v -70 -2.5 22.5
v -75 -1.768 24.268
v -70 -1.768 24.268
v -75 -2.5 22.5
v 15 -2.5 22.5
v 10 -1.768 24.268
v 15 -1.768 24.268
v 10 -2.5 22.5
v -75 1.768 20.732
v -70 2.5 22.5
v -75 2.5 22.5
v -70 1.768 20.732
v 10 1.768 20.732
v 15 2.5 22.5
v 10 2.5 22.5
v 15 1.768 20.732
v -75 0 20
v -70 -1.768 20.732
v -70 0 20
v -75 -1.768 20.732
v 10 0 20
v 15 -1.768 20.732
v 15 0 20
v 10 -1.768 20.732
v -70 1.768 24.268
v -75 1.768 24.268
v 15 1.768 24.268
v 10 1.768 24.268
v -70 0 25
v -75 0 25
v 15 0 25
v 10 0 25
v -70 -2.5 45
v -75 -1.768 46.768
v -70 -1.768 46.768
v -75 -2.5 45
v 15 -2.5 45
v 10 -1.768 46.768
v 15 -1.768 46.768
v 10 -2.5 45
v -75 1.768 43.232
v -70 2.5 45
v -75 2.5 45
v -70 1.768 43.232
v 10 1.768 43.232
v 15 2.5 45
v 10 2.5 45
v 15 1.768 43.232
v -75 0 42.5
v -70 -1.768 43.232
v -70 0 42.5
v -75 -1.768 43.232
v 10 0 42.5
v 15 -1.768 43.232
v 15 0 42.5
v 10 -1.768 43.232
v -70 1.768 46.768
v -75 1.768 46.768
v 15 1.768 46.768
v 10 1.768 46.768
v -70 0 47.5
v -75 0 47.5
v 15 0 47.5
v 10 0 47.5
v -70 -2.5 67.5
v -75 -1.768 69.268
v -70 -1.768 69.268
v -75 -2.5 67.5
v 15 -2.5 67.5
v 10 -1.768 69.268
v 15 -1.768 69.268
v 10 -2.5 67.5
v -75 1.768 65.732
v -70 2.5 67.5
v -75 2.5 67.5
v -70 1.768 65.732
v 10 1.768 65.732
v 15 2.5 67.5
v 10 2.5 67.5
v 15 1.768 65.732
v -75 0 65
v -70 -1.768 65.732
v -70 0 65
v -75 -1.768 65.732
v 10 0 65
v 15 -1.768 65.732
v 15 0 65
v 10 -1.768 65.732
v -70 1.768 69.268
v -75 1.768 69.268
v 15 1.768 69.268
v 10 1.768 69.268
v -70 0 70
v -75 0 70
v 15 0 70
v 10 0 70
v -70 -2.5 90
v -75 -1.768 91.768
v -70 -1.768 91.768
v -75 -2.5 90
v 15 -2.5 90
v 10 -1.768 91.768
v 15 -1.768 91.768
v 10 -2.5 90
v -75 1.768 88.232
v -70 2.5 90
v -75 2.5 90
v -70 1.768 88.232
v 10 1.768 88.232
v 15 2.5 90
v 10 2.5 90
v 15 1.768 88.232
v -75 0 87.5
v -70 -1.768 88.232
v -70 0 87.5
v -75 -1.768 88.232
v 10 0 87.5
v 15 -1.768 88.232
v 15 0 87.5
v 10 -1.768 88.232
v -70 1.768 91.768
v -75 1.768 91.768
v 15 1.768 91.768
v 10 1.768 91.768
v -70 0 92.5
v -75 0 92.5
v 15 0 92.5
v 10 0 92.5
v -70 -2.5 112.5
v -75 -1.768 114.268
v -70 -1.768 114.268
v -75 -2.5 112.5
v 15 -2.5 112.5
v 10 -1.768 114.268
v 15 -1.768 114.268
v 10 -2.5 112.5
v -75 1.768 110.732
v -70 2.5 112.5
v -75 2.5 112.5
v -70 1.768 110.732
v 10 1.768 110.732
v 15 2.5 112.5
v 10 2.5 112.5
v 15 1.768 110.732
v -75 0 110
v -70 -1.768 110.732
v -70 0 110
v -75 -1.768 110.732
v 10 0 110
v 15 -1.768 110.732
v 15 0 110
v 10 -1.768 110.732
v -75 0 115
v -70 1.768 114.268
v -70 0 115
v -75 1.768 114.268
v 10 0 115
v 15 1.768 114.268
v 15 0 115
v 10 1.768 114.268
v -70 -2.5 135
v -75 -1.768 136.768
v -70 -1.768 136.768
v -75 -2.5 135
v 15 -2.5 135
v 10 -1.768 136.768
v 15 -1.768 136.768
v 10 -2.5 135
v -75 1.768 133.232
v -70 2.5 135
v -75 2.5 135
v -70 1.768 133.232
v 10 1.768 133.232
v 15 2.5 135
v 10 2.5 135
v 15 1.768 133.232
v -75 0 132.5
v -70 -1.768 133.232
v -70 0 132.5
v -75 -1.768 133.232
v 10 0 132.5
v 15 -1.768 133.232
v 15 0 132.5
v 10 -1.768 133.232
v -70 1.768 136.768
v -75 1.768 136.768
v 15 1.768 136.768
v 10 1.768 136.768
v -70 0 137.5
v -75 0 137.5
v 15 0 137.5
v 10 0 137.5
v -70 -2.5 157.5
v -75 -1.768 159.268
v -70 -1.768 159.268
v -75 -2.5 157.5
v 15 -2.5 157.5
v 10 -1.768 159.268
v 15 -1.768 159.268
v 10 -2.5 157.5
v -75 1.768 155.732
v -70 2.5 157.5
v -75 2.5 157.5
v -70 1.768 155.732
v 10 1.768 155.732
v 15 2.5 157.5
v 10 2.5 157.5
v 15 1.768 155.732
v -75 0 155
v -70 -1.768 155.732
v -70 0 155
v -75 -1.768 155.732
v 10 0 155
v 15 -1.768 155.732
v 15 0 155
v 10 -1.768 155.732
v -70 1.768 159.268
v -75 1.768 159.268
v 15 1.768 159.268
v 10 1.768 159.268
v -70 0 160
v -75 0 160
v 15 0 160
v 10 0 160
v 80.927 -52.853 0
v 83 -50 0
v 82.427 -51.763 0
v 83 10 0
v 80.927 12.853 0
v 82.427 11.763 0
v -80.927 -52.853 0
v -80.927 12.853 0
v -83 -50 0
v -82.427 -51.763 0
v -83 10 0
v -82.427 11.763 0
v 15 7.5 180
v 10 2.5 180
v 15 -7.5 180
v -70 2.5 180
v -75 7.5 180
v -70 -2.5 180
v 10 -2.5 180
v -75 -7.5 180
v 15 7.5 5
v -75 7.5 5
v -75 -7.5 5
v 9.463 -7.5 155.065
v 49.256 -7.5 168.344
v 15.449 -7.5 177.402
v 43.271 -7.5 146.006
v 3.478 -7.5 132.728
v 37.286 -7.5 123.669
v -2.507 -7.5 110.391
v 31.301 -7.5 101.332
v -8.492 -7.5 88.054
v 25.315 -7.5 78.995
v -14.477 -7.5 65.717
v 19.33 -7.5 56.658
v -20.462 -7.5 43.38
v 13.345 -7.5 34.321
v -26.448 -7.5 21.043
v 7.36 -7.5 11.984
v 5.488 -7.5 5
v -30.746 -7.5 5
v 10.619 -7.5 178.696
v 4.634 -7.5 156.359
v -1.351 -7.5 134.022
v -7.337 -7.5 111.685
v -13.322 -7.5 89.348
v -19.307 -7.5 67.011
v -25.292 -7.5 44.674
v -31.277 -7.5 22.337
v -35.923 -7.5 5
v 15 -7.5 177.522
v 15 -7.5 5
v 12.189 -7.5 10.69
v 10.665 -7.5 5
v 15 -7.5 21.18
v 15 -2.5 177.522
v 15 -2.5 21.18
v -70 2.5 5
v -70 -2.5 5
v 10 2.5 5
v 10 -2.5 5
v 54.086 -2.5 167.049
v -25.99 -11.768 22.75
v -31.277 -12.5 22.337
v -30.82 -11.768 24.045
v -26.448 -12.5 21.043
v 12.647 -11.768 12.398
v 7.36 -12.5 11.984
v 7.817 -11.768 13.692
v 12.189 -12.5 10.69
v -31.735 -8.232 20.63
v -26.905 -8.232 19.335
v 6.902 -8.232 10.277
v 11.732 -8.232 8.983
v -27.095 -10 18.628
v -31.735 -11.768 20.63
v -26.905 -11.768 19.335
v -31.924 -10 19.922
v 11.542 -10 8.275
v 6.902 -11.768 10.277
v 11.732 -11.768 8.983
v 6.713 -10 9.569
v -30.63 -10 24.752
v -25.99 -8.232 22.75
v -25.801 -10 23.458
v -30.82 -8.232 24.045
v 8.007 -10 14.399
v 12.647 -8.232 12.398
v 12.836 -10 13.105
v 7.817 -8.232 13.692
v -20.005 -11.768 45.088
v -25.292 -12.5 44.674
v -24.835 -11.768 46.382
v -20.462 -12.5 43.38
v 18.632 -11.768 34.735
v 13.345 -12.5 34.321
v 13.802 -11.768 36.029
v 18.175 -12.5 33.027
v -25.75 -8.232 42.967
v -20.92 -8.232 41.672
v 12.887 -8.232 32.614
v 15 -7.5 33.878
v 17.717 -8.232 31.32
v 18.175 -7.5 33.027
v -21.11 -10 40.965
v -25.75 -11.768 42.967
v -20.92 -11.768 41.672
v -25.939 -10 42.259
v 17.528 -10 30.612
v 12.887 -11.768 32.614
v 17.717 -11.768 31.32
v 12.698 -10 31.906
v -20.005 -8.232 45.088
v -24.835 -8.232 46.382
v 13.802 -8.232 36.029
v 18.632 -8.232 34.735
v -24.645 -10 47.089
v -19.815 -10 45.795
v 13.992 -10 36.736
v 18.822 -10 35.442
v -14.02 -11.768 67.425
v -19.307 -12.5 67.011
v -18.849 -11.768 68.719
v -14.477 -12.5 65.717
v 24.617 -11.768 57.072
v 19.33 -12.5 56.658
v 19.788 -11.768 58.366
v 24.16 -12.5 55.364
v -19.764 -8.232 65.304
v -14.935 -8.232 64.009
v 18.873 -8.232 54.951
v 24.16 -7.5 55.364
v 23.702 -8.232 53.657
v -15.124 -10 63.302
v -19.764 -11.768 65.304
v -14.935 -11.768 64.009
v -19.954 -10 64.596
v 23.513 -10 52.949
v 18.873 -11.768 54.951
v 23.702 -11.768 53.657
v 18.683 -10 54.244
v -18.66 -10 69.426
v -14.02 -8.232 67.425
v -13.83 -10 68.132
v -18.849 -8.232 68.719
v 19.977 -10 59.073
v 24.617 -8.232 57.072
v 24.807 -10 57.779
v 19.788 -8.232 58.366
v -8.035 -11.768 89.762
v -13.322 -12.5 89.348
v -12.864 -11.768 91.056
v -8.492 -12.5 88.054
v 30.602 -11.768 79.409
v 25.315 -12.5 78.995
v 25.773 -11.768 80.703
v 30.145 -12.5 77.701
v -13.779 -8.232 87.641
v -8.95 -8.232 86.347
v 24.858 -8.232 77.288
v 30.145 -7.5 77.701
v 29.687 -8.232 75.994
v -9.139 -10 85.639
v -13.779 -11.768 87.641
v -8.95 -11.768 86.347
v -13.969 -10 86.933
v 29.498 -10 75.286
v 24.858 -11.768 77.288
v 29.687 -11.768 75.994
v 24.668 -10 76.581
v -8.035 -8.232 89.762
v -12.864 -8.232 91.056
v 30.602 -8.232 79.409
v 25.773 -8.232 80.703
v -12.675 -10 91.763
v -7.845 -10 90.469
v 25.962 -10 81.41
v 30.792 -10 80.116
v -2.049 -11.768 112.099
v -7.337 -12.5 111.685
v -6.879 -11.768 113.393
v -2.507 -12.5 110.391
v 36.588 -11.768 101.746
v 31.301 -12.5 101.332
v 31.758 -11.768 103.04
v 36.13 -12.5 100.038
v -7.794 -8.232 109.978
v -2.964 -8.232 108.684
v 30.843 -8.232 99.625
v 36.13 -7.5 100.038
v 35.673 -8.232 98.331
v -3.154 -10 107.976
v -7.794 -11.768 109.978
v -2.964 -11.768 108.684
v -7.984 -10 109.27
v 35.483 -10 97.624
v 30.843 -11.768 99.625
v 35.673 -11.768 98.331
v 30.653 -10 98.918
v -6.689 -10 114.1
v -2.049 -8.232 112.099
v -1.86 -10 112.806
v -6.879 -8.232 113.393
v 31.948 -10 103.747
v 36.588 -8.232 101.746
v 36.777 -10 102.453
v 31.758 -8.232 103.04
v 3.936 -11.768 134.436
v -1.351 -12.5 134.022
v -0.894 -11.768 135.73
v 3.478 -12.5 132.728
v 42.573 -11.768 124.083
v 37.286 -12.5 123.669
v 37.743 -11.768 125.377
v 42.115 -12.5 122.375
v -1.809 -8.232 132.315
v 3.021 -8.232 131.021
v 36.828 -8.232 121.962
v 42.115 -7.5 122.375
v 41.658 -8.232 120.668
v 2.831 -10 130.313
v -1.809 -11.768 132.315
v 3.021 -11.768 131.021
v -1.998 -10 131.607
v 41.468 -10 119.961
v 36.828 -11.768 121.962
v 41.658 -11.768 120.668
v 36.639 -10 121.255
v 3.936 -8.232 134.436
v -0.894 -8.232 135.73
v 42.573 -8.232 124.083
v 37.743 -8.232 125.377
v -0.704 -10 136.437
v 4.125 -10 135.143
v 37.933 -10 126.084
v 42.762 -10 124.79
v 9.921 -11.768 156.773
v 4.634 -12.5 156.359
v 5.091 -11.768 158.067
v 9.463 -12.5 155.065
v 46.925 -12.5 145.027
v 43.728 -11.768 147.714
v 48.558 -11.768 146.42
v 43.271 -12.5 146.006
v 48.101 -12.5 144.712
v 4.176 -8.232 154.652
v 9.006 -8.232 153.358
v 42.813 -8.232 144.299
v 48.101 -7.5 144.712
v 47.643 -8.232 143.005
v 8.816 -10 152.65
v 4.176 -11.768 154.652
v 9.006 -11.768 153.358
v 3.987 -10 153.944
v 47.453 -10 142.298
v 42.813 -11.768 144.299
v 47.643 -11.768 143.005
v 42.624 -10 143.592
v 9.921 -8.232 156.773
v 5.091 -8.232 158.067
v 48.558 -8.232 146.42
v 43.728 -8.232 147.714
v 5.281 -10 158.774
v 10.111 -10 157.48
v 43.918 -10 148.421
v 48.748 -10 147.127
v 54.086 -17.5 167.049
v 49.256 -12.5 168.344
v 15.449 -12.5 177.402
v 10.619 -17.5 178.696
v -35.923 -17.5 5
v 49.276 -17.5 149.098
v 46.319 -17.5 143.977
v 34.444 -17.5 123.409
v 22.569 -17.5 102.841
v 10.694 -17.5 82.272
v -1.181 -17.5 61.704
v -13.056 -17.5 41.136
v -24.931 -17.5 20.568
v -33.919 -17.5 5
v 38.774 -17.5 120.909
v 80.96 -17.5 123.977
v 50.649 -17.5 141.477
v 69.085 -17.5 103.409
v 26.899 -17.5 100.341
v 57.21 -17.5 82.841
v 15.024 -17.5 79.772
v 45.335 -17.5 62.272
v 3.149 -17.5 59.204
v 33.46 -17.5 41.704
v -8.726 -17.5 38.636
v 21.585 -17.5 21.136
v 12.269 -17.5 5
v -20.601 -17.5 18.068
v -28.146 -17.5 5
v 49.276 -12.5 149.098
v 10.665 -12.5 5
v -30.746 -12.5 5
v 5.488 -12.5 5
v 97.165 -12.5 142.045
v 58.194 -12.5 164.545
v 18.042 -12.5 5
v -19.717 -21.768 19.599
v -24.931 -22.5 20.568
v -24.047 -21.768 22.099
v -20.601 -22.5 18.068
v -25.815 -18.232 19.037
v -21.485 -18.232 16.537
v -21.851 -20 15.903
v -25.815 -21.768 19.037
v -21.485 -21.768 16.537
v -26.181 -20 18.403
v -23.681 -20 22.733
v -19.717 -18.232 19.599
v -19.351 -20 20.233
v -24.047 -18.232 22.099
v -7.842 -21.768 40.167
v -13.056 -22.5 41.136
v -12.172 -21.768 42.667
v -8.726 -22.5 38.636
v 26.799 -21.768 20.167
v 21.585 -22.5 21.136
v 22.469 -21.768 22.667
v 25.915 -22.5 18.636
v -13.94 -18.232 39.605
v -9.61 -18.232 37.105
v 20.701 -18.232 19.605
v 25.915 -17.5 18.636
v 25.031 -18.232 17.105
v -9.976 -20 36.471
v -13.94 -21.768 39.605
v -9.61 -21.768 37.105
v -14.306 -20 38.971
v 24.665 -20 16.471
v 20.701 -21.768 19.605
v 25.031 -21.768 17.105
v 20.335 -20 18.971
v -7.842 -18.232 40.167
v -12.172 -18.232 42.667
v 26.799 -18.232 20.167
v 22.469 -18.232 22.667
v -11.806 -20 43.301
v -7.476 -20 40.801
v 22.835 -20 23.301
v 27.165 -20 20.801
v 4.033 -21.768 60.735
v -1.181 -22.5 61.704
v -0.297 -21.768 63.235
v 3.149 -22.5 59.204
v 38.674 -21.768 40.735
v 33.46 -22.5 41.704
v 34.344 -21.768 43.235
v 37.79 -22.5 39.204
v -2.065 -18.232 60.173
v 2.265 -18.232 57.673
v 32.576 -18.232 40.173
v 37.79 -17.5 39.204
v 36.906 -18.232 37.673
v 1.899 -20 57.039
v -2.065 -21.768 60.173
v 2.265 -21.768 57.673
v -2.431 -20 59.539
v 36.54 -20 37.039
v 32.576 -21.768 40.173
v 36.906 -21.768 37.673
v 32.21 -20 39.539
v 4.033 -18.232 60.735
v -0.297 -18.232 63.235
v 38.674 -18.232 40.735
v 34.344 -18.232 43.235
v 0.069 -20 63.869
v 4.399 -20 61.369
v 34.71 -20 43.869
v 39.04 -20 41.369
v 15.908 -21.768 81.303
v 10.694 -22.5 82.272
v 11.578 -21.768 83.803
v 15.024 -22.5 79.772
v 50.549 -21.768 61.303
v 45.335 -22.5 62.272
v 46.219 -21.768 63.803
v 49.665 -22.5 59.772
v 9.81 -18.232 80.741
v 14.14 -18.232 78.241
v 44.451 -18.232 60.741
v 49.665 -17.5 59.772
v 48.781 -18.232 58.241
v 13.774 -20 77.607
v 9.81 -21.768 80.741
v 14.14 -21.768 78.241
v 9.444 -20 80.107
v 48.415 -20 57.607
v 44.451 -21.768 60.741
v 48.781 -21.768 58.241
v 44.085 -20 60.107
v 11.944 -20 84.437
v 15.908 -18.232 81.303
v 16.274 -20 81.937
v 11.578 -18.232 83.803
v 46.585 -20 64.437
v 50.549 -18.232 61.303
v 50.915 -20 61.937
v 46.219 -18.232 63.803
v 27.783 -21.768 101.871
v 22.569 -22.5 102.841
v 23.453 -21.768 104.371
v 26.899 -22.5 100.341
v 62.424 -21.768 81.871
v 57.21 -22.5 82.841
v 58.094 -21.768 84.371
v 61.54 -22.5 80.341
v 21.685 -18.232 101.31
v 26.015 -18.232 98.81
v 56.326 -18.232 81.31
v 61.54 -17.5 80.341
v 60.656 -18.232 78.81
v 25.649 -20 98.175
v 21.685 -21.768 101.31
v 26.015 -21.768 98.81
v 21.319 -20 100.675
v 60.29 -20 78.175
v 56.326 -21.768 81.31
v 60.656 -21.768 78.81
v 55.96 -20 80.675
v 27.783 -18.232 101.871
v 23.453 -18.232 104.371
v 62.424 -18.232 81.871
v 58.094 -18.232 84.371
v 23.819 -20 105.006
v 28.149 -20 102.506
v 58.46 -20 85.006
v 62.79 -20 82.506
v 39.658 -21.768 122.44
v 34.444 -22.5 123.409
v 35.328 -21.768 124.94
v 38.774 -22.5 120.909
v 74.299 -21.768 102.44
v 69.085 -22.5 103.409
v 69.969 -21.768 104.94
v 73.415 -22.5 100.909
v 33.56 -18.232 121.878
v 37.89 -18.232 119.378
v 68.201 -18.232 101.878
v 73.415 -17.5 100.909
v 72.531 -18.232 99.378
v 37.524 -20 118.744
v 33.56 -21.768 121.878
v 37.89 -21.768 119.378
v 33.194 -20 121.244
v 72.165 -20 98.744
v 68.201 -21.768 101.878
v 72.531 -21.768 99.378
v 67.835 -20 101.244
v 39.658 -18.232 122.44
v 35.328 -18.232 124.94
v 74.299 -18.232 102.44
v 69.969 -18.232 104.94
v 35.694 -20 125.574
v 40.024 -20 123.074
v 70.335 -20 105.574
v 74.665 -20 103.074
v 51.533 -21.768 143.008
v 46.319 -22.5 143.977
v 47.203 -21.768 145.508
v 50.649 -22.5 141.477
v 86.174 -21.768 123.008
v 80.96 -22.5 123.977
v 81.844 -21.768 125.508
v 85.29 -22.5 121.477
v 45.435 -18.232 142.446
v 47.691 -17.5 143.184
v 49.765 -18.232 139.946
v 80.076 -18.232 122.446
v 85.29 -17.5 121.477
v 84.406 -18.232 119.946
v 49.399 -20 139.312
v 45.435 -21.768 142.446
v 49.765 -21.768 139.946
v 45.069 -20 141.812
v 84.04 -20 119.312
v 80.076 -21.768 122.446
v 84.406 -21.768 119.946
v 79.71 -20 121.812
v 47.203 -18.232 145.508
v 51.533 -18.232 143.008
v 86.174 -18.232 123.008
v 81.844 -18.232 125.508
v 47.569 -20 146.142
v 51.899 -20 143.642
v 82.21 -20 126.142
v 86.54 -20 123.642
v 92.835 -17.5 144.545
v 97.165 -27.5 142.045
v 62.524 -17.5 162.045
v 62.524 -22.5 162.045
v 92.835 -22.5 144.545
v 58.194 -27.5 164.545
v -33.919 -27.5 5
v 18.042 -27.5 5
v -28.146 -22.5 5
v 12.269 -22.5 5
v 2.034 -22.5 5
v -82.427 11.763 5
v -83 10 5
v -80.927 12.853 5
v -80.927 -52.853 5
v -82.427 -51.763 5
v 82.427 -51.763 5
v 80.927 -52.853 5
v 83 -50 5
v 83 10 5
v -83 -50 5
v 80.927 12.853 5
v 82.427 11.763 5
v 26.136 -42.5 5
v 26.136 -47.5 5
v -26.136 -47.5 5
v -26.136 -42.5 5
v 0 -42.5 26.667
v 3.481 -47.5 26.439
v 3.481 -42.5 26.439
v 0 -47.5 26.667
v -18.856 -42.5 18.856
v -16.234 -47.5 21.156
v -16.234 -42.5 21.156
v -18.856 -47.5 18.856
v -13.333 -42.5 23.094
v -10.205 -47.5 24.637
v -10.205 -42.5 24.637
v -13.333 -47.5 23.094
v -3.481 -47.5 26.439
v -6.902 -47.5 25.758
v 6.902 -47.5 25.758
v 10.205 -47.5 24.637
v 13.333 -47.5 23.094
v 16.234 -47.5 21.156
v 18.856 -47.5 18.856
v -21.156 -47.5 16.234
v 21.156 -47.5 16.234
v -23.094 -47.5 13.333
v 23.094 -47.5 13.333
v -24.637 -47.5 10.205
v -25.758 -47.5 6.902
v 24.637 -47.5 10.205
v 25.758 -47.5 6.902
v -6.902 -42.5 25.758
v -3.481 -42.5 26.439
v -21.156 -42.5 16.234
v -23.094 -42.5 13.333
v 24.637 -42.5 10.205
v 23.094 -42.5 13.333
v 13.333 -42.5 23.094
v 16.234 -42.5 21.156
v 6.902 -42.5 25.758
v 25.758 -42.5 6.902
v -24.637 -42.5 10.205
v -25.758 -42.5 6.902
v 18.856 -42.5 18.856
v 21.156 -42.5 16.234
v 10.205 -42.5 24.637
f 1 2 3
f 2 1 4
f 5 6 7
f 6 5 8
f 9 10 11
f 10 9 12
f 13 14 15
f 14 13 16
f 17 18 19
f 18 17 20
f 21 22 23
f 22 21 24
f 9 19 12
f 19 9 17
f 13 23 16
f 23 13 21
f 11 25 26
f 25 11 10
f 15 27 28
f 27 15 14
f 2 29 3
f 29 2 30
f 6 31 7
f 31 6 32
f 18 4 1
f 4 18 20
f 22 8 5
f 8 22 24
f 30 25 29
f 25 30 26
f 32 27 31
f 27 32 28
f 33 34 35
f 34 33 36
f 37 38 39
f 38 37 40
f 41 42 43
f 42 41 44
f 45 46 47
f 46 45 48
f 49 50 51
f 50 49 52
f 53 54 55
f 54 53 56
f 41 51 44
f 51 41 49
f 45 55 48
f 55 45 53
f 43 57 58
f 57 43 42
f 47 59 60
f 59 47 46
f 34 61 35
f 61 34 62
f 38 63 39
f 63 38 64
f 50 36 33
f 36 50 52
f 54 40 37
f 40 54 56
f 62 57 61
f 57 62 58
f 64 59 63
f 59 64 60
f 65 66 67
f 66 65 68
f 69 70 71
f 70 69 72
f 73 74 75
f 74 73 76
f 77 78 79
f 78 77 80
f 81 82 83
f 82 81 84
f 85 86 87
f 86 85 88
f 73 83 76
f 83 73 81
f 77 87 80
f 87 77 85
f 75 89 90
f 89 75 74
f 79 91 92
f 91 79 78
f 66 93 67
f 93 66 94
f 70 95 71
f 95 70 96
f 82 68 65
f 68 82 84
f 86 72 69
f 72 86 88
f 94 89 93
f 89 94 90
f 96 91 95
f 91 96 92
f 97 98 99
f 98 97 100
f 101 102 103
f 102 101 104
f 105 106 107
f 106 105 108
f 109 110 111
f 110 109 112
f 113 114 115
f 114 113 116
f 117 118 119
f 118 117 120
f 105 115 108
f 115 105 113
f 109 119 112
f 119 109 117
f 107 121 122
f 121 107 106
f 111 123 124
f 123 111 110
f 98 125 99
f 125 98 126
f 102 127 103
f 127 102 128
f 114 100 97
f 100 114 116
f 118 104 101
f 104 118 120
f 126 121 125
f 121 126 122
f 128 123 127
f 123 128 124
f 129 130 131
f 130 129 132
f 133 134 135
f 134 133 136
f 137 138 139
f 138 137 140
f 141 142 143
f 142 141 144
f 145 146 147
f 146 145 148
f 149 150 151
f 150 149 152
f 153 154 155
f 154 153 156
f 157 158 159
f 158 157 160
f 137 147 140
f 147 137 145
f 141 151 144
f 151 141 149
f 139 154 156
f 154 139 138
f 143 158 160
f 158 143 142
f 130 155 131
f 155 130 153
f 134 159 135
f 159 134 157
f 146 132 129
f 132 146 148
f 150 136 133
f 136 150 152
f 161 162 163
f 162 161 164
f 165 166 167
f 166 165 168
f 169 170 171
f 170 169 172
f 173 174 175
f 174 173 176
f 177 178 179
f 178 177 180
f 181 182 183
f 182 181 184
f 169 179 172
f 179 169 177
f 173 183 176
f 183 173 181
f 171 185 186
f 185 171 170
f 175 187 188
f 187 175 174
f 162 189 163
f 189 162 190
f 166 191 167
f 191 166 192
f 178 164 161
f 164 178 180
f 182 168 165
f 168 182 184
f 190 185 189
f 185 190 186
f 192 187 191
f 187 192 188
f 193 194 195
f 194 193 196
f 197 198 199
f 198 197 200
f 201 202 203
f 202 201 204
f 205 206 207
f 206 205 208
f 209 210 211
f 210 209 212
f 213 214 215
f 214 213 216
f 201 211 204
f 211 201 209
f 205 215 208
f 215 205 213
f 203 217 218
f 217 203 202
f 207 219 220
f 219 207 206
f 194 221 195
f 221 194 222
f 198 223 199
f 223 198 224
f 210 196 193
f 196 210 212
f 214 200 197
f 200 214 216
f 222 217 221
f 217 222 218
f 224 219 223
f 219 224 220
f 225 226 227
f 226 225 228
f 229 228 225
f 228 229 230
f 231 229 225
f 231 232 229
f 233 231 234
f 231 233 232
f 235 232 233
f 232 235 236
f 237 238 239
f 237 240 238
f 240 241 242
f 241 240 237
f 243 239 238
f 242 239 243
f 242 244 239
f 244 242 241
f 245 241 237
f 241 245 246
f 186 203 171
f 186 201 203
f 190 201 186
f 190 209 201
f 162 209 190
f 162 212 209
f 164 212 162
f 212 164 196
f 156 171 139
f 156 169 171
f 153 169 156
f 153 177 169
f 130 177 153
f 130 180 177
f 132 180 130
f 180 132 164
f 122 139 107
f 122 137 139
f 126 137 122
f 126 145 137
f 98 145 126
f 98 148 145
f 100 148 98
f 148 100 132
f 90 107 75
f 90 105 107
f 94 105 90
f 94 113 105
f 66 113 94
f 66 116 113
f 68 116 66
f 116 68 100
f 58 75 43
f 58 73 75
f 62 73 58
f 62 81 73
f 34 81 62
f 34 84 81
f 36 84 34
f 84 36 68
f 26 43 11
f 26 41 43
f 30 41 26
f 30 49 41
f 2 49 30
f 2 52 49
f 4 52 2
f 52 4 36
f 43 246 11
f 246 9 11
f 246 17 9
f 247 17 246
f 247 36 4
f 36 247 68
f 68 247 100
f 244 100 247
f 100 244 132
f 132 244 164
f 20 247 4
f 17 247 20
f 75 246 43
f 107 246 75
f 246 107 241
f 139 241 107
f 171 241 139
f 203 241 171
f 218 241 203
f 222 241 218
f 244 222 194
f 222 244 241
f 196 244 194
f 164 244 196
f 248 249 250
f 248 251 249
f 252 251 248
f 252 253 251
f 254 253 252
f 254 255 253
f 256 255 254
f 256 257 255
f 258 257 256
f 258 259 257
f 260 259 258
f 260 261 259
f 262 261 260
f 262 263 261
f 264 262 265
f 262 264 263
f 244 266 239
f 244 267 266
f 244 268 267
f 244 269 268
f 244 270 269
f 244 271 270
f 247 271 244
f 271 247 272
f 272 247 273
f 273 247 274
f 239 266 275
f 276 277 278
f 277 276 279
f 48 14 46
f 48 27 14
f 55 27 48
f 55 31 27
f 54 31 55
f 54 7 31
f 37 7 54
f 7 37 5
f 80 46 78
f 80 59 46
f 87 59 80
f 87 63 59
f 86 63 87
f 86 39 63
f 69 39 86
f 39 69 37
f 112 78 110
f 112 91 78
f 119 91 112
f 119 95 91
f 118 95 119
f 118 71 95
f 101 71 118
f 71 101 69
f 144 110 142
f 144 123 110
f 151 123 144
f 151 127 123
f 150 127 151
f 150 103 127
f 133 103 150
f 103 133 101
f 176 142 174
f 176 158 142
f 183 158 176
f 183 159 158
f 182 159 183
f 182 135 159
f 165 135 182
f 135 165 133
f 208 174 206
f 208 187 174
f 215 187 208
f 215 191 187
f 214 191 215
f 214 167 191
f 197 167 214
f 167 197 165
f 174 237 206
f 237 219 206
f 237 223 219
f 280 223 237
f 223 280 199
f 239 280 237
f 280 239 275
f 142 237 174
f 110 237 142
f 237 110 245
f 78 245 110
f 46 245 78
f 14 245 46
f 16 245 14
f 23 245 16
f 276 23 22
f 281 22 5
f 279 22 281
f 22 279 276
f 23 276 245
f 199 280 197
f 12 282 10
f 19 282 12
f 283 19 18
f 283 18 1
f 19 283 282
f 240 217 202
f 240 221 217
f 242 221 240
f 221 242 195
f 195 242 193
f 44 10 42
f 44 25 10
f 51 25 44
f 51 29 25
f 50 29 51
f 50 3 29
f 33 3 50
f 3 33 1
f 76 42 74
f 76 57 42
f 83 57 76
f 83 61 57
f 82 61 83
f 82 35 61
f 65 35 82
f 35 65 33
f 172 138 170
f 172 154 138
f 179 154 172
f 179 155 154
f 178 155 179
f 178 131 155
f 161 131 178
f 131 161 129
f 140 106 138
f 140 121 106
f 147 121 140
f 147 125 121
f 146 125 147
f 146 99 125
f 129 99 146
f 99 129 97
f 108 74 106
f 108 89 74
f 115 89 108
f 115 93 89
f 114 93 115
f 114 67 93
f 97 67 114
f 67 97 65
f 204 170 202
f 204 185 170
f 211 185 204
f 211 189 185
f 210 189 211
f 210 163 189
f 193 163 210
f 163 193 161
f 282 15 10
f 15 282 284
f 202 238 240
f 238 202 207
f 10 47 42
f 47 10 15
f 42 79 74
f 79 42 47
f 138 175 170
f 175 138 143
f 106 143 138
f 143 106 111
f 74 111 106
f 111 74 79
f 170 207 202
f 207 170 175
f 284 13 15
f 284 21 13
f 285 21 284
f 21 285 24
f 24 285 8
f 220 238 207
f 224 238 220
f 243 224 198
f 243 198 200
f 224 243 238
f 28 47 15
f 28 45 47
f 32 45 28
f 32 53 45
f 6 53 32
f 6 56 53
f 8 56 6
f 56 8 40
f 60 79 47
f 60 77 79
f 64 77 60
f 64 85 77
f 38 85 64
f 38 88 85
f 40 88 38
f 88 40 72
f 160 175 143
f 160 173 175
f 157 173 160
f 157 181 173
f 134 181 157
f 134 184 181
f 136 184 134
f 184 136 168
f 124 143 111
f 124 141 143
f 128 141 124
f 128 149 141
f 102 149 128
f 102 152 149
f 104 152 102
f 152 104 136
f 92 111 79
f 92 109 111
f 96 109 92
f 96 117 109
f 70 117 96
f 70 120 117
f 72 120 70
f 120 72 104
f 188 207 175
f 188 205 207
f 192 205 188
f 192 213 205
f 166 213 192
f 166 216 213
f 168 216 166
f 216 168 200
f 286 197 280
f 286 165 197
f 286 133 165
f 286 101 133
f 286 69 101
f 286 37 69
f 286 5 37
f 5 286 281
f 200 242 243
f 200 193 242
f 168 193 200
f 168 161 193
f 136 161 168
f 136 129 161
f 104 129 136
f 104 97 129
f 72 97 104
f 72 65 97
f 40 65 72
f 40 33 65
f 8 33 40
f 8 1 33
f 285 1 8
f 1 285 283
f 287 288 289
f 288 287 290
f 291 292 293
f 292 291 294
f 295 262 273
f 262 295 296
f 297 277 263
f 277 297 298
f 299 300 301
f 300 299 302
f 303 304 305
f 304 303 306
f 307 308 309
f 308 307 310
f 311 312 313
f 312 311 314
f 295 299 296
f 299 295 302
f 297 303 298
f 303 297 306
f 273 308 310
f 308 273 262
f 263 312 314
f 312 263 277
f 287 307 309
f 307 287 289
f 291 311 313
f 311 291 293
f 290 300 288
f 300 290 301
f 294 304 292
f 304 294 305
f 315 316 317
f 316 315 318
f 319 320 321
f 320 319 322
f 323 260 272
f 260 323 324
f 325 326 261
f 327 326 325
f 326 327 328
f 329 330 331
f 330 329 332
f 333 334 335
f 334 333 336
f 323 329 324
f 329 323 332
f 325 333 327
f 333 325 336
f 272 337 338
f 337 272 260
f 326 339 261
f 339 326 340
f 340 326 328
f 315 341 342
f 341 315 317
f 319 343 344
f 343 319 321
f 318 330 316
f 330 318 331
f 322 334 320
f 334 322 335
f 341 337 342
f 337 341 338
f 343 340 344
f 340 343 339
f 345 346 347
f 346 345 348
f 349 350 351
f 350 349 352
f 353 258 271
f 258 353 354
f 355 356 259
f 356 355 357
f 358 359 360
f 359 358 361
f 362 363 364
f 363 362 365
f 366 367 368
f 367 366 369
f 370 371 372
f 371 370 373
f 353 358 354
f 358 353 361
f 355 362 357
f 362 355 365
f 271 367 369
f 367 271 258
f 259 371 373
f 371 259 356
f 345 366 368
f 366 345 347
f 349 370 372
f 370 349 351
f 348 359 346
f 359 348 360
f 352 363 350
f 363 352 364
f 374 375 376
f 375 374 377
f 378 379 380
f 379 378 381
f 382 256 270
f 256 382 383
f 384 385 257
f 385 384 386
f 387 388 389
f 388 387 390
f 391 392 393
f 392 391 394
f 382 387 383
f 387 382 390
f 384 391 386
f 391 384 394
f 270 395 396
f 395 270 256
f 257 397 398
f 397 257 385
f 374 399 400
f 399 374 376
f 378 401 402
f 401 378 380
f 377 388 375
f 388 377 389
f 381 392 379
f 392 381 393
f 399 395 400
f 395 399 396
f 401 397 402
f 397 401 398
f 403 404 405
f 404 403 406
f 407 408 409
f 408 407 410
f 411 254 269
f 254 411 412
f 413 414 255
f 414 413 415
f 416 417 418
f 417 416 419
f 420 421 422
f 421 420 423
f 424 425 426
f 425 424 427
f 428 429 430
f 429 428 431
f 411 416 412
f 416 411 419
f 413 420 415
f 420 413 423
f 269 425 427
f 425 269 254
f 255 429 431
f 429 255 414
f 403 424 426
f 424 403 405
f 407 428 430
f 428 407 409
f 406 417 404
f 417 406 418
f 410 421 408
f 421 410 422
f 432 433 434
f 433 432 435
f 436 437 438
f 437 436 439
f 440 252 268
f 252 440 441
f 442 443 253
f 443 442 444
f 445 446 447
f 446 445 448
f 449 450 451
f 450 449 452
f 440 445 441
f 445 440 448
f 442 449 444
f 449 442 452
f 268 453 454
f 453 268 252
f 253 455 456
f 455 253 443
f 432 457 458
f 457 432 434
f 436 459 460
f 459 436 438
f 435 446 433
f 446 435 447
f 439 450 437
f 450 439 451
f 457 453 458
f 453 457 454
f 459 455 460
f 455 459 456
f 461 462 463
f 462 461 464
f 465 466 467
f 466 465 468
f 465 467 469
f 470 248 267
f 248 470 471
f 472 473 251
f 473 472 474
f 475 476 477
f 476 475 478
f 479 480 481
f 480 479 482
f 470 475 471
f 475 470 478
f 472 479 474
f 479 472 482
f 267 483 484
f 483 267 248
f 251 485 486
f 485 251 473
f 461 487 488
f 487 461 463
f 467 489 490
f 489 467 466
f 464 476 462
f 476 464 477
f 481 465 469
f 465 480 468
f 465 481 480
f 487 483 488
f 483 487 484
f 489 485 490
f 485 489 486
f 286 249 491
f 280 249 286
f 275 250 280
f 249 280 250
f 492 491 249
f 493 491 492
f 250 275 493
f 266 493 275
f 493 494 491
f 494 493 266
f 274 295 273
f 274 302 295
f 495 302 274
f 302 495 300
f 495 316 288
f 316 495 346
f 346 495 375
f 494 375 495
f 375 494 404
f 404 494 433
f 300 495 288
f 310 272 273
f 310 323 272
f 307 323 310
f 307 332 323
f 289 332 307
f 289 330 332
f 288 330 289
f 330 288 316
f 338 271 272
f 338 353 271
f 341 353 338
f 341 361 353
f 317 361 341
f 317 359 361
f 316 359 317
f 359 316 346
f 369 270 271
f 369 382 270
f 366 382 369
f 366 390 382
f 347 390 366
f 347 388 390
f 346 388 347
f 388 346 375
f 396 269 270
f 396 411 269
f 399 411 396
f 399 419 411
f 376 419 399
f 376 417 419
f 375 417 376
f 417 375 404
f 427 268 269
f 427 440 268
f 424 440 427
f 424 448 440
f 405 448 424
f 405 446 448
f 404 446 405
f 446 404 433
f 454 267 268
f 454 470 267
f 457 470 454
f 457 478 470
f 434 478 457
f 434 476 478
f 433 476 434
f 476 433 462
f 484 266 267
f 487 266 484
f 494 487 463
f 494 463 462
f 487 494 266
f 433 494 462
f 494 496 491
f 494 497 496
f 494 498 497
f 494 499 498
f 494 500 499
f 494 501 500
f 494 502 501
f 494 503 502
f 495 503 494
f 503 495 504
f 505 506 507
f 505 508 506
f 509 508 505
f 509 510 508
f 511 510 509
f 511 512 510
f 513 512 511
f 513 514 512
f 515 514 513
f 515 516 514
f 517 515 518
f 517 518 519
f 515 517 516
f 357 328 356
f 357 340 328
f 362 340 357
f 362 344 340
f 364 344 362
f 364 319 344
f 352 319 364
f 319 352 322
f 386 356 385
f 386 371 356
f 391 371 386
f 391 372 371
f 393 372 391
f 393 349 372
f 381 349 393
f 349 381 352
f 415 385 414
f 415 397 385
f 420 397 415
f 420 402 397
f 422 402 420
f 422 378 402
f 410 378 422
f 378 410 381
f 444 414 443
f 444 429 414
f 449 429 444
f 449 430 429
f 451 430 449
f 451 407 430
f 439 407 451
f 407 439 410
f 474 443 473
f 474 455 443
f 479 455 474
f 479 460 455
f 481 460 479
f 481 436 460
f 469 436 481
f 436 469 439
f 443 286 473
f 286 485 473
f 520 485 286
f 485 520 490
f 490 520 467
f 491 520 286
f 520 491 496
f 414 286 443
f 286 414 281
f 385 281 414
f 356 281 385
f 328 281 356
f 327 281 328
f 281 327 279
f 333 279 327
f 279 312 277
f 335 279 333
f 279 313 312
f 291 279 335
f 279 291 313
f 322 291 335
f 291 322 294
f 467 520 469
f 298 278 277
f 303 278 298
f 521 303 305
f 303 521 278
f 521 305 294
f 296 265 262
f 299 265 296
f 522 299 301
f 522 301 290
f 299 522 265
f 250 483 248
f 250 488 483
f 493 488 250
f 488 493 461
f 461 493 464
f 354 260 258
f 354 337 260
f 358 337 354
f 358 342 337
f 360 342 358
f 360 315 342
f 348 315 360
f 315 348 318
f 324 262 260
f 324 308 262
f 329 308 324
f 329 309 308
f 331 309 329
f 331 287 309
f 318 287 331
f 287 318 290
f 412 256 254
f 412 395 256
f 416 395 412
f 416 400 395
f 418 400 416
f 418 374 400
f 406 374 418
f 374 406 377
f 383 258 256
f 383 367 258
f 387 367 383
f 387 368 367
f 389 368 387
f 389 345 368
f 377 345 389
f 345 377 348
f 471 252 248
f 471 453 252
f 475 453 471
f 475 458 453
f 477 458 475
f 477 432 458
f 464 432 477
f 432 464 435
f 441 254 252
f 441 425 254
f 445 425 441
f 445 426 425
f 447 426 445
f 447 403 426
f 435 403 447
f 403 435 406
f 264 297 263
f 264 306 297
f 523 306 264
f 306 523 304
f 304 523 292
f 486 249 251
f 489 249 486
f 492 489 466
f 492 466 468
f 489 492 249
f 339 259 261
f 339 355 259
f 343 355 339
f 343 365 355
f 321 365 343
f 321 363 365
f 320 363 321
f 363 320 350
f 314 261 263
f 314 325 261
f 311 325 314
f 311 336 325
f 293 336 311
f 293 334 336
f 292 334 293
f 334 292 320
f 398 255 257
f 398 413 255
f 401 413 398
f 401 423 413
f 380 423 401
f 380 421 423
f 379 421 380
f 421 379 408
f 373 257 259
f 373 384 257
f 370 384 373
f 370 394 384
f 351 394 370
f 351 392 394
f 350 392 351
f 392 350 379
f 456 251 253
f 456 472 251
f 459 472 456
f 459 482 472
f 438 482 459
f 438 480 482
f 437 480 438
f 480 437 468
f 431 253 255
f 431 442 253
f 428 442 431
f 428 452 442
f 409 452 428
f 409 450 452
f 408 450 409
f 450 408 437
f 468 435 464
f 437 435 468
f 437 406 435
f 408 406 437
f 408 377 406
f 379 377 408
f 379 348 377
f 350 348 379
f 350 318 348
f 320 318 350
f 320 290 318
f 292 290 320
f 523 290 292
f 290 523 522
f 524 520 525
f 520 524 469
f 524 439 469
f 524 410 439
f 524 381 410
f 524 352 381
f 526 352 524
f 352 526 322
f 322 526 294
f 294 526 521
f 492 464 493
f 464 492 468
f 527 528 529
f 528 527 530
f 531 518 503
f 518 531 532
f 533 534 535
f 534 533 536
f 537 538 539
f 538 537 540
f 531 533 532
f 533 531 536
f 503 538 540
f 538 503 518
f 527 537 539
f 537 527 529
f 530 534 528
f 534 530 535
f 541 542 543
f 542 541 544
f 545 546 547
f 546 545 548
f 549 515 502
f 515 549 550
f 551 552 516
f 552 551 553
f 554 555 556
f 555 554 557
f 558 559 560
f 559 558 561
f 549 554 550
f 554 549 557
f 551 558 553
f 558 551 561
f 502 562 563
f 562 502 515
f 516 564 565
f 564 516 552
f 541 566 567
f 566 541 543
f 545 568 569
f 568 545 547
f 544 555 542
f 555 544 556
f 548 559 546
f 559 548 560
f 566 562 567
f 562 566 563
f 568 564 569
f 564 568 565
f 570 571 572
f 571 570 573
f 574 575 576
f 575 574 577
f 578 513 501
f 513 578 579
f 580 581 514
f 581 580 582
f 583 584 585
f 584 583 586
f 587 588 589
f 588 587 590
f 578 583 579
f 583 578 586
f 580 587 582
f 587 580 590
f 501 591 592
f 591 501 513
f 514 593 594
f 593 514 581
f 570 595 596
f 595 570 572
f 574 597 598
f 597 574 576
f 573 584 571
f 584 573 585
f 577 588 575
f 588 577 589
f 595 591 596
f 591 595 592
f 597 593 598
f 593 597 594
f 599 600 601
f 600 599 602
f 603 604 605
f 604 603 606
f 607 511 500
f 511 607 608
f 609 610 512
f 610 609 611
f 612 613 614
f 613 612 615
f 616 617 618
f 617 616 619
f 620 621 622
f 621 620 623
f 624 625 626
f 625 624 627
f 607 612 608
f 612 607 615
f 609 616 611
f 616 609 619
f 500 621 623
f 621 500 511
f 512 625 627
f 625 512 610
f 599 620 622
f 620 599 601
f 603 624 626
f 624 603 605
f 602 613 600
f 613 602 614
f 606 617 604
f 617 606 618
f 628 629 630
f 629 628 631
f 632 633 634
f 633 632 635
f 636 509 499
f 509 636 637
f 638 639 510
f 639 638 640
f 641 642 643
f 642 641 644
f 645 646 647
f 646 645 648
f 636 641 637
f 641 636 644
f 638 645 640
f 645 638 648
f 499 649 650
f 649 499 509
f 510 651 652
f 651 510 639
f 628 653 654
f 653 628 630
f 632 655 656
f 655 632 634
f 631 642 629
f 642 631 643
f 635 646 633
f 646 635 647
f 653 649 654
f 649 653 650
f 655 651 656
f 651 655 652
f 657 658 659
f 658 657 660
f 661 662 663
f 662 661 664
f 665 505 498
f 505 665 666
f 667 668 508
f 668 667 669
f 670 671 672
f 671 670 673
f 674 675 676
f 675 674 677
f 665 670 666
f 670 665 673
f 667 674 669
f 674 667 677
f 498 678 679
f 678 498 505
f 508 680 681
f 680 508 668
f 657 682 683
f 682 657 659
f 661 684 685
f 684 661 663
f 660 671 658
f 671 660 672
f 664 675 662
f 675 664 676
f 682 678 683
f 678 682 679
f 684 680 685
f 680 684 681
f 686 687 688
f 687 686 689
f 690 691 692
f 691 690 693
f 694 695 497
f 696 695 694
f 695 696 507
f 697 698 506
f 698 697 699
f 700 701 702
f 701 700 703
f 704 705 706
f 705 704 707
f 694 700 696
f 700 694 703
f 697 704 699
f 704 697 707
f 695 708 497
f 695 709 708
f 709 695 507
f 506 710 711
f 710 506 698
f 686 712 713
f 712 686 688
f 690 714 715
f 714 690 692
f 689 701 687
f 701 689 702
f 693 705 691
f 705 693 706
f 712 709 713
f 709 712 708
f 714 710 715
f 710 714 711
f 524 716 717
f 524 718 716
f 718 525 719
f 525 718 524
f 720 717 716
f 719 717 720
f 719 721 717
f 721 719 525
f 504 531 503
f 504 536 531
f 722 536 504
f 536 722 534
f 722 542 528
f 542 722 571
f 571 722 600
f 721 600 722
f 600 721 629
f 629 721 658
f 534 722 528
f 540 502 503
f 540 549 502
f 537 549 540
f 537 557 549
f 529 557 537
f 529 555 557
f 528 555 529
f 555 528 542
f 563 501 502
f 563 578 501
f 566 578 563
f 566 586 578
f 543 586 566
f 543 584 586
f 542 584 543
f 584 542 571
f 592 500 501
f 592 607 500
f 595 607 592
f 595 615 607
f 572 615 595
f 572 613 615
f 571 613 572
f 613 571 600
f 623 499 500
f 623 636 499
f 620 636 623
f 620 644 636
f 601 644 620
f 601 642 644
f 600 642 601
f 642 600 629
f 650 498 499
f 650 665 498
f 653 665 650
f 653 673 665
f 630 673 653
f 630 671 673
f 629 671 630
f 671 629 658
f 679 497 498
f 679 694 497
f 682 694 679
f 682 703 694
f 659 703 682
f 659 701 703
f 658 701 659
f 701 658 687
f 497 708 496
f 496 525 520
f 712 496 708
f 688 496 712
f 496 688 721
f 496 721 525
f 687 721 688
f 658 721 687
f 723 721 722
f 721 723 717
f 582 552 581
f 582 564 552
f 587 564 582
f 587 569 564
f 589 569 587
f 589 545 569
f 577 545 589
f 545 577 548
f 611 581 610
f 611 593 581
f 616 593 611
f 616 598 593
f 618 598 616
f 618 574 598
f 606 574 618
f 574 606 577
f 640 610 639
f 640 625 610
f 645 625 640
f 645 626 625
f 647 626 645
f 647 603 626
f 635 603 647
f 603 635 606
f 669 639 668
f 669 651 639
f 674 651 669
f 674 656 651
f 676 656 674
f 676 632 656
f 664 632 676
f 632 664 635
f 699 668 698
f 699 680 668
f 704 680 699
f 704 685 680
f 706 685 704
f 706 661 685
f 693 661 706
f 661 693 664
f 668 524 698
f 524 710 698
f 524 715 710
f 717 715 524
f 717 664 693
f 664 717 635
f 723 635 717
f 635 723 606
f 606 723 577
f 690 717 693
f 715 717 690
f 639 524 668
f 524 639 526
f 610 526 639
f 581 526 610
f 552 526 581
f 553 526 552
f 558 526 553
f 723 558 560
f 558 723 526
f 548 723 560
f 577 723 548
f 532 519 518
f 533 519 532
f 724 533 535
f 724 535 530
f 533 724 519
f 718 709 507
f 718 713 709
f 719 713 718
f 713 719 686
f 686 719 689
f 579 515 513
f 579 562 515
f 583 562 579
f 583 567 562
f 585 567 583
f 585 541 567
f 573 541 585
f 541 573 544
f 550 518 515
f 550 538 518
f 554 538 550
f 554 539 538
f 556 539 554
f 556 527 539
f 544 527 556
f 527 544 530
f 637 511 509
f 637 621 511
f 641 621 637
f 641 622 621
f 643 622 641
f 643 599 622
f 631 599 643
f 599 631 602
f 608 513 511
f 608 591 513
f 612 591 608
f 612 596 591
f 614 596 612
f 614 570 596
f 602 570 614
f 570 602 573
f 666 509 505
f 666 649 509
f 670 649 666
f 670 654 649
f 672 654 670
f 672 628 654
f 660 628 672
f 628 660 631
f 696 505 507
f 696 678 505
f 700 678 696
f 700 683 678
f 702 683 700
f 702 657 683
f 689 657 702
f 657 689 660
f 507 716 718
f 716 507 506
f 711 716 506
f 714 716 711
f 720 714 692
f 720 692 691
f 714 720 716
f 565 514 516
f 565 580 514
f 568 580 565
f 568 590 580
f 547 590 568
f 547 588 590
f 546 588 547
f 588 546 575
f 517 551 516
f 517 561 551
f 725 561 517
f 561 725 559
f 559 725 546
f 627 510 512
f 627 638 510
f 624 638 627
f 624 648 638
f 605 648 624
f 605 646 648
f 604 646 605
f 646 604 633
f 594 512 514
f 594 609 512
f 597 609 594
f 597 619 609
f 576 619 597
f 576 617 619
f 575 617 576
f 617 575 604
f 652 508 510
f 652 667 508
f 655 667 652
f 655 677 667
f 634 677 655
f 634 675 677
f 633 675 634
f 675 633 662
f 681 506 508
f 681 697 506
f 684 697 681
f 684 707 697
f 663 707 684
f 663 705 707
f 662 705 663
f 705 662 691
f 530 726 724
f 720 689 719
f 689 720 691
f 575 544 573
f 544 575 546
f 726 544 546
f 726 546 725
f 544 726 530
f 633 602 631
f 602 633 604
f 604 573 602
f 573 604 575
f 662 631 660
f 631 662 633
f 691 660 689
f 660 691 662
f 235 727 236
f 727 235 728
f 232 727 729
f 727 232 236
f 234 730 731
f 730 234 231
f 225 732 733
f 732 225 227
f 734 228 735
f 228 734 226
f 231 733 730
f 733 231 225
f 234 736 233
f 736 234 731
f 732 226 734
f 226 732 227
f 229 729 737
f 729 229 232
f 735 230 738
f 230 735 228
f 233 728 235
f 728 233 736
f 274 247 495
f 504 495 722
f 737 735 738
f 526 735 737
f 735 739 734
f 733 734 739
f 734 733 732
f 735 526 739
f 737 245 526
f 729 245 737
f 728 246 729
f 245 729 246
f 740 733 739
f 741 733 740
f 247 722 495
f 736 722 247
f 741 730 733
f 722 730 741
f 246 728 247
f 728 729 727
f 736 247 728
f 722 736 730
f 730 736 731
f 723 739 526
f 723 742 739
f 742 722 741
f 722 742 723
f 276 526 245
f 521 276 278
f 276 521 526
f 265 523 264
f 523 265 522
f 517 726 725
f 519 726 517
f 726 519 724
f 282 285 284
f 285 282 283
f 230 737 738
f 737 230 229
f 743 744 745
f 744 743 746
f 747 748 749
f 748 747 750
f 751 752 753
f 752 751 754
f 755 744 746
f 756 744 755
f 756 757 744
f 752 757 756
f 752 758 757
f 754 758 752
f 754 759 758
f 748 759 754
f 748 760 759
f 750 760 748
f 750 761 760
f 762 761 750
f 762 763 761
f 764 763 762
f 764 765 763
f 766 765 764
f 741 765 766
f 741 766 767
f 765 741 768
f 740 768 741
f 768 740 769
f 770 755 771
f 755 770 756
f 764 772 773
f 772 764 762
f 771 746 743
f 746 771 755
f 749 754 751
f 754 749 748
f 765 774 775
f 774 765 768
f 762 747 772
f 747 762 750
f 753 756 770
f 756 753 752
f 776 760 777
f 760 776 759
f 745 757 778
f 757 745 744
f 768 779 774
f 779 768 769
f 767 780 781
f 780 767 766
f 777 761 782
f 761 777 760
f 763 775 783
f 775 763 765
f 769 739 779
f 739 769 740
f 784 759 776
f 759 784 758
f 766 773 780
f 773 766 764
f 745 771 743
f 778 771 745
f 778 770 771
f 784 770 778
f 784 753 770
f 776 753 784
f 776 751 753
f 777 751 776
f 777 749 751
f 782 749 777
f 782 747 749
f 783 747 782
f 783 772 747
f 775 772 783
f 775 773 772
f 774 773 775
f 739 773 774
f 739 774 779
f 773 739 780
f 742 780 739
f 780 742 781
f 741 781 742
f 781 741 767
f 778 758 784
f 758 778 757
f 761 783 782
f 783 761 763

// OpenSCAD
cutting_board_thicnkess = 15;

bottom_length = 160;
bottom_height = 5;

edge_width = 5;
slot_width = 5;

knife_1_length = 180;
knife_1_width = 80;

knife_2_length = 185;
knife_2_width = 35;

knife_3_length = 190;
knife_3_width = 35;

module cutting_board_knife_rack(knifes, bottom_length, bottom_height, edge_width, slot_width, offset_angle = 15) {

    offset_y = slot_width + edge_width;
    len_of_knifes = len(knifes);

    bottom_width = offset_y * len_of_knifes + cutting_board_thicnkess + edge_width * 2 + slot_width;

    for(i = [0:len_of_knifes - 1]) {

        a = offset_angle * i;
        offset_z = (knifes[i][1] + 2 * edge_width) * sin(a);
        w = (knifes[i][1] + 2 * edge_width) / cos(a) * 2;

        translate([0, -offset_y * i, 0]) difference() {
            // a knife holder
            translate([-w / 6 , 0, -0.5 * offset_z]) rotate([0, a, 0]) difference() {
                linear_extrude(knifes[i][0]) difference() {
                    square([
                        knifes[i][1] + 2 * edge_width, 
                        slot_width + 2 * edge_width
                    ], center = true);
                        
                    square([knifes[i][1], slot_width], center = true);
                }
                
                // vents
                for(j = [0:7]) {
                    translate([0, 0, knifes[i][0] / 8 * j]) 
                        rotate([0, 90, 0]) 
                            linear_extrude(knifes[i][0], center = true) 
                                circle(slot_width / 2);
                }
            }
            
            // cut off the bottom of the holder
            translate([0, 0, -offset_z]) 
                linear_extrude(offset_z) 
                   square([w, slot_width + 2 * edge_width], center = true);
        }

    }

    // rack bottom
    translate([0, -bottom_width / 2 + edge_width + slot_width, 0]) 
        linear_extrude(bottom_height) minkowski() {
        
        square([bottom_length, bottom_width], center = true);
        circle(bottom_width / 20);
    }

    // cutting board holder
    translate([0, -offset_y * len_of_knifes - cutting_board_thicnkess, 0]) 
        rotate([-90, 0, 0]) linear_extrude(edge_width, center = true) difference() {
        
        circle(bottom_length / 6, $fn = 48);
        
        translate([-bottom_length / 4, 0, 0]) 
            square([bottom_length / 2, bottom_length / 2]);
    }

}

cutting_board_knife_rack(
    [
        [knife_1_length, knife_1_width], 
        [knife_2_length, knife_2_width], 
        [knife_3_length, knife_3_width]
    ], 
    bottom_length, 
    bottom_height, 
    edge_width, 
    slot_width,
    15 // offset_angle
);
